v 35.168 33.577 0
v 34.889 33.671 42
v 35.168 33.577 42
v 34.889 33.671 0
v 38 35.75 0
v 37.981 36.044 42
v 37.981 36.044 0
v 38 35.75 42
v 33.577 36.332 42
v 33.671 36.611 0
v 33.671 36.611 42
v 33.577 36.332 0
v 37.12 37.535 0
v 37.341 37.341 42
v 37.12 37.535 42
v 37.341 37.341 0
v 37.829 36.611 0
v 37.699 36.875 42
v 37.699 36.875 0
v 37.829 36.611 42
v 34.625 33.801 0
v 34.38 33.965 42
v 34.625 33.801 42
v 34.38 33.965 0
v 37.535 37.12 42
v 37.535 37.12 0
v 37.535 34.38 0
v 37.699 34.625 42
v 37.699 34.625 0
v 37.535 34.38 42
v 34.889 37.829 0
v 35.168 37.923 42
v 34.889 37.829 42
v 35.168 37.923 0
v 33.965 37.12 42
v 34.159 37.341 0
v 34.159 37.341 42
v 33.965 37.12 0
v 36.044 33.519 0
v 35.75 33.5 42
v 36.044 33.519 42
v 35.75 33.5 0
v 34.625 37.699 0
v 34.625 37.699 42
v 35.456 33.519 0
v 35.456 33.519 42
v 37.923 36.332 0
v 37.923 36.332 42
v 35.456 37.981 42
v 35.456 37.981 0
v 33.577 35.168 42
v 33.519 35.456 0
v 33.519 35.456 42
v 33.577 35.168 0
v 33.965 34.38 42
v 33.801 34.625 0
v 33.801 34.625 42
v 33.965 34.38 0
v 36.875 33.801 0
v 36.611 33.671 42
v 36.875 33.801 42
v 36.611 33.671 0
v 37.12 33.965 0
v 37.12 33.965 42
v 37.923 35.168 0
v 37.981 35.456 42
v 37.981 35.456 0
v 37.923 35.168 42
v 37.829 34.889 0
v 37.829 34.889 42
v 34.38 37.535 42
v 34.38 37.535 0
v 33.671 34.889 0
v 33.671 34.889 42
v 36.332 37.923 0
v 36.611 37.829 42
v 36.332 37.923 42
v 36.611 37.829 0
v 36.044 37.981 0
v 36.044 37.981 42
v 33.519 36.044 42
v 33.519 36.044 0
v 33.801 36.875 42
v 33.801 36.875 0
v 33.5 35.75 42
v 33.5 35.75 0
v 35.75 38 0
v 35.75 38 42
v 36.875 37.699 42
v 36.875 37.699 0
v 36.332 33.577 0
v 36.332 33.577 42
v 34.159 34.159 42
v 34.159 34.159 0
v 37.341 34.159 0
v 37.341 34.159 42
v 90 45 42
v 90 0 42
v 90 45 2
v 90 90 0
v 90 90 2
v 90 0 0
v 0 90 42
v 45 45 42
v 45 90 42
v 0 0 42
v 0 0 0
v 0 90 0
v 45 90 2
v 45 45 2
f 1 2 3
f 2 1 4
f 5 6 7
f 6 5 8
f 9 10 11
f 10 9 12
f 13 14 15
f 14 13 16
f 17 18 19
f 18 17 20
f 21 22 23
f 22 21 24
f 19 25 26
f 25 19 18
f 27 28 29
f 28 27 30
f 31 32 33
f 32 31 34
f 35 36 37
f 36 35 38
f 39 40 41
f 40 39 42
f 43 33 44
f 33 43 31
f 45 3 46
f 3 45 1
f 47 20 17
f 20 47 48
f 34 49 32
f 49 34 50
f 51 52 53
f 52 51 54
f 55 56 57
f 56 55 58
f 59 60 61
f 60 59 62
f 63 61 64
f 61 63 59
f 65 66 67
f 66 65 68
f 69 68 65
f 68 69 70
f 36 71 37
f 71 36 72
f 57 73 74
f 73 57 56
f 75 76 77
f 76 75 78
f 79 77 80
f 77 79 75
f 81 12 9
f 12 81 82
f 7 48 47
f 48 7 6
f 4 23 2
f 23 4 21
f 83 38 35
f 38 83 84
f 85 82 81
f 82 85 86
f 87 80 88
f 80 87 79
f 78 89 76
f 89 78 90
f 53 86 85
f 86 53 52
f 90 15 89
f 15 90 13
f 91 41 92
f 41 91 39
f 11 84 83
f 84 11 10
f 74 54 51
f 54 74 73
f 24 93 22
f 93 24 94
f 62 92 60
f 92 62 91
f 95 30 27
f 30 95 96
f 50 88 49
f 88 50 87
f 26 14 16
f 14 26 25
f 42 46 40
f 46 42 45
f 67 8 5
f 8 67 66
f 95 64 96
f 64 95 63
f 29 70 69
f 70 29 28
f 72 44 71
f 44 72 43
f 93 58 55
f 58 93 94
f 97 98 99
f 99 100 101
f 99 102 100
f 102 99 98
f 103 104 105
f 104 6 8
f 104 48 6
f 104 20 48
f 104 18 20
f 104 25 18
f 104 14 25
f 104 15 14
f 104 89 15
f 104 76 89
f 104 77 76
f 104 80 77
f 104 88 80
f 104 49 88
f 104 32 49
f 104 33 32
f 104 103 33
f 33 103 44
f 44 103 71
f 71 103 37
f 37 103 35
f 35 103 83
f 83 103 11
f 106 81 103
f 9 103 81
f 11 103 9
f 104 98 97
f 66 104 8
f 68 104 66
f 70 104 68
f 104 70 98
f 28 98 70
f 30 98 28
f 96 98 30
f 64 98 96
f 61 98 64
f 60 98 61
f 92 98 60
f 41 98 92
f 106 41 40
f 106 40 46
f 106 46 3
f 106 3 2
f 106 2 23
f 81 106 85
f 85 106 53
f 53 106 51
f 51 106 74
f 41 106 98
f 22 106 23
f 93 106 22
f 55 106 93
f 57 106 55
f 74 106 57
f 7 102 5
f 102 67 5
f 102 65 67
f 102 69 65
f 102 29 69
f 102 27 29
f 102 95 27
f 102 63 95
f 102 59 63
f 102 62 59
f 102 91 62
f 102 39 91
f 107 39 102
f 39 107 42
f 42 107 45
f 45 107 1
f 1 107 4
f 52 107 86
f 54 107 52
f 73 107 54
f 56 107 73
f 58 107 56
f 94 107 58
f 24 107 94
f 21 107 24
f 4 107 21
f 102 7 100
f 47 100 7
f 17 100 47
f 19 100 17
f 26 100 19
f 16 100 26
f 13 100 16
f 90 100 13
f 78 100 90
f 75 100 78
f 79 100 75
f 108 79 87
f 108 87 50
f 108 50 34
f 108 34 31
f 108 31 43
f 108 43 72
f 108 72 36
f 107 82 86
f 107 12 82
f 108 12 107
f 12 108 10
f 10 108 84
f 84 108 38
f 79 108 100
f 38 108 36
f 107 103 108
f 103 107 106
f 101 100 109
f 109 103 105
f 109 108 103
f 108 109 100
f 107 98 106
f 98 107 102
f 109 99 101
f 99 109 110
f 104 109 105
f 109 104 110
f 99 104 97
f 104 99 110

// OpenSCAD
// Fan cover - an open box (top open) that mounts over a round PC case fan to turn it into a
// magnetic stirrer. The top plate is the stirring surface. This is the print orientation: the
// top plate lies on the bed (z = 0) and the walls rise upward.
//

top     = 90;
width   = 90;
height  = 40;
wall    = 2.5;
screw   = 4.5;
pattern = 71.5;
notch   = 12;

$fn = 48;

plate_h = 2;

difference() {
    cube([top, width, height + plate_h]);
    translate([top / 2, width / 2, plate_h]) cube([top, width, height]);       // hollow inside
    for (x = [-pattern / 2, pattern / 2])
        for (y = [-pattern / 2, pattern / 2])
            translate([x, y, -1]) cylinder(h = height + plate_h + 2, d = screw);  // screw holes
    // cable notch: 12 mm wide, centred along the wall, reaching 8 mm down from the open edge
    translate([top / 2, width / 2, height - 10]) cube([top, width, 10]);        // block one wall end
    translate([top / 2, width / 2, height - 10]) cube([top, width, 10]);        // block the opposite wall end
    translate([top / 2, width / 2, height - 10]) cube([top, width, 10]);        // block the opposite wall end
    translate([top / 2, width / 2, height - 10]) cube([top, width, 10]);        // block the opposite wall end
}
